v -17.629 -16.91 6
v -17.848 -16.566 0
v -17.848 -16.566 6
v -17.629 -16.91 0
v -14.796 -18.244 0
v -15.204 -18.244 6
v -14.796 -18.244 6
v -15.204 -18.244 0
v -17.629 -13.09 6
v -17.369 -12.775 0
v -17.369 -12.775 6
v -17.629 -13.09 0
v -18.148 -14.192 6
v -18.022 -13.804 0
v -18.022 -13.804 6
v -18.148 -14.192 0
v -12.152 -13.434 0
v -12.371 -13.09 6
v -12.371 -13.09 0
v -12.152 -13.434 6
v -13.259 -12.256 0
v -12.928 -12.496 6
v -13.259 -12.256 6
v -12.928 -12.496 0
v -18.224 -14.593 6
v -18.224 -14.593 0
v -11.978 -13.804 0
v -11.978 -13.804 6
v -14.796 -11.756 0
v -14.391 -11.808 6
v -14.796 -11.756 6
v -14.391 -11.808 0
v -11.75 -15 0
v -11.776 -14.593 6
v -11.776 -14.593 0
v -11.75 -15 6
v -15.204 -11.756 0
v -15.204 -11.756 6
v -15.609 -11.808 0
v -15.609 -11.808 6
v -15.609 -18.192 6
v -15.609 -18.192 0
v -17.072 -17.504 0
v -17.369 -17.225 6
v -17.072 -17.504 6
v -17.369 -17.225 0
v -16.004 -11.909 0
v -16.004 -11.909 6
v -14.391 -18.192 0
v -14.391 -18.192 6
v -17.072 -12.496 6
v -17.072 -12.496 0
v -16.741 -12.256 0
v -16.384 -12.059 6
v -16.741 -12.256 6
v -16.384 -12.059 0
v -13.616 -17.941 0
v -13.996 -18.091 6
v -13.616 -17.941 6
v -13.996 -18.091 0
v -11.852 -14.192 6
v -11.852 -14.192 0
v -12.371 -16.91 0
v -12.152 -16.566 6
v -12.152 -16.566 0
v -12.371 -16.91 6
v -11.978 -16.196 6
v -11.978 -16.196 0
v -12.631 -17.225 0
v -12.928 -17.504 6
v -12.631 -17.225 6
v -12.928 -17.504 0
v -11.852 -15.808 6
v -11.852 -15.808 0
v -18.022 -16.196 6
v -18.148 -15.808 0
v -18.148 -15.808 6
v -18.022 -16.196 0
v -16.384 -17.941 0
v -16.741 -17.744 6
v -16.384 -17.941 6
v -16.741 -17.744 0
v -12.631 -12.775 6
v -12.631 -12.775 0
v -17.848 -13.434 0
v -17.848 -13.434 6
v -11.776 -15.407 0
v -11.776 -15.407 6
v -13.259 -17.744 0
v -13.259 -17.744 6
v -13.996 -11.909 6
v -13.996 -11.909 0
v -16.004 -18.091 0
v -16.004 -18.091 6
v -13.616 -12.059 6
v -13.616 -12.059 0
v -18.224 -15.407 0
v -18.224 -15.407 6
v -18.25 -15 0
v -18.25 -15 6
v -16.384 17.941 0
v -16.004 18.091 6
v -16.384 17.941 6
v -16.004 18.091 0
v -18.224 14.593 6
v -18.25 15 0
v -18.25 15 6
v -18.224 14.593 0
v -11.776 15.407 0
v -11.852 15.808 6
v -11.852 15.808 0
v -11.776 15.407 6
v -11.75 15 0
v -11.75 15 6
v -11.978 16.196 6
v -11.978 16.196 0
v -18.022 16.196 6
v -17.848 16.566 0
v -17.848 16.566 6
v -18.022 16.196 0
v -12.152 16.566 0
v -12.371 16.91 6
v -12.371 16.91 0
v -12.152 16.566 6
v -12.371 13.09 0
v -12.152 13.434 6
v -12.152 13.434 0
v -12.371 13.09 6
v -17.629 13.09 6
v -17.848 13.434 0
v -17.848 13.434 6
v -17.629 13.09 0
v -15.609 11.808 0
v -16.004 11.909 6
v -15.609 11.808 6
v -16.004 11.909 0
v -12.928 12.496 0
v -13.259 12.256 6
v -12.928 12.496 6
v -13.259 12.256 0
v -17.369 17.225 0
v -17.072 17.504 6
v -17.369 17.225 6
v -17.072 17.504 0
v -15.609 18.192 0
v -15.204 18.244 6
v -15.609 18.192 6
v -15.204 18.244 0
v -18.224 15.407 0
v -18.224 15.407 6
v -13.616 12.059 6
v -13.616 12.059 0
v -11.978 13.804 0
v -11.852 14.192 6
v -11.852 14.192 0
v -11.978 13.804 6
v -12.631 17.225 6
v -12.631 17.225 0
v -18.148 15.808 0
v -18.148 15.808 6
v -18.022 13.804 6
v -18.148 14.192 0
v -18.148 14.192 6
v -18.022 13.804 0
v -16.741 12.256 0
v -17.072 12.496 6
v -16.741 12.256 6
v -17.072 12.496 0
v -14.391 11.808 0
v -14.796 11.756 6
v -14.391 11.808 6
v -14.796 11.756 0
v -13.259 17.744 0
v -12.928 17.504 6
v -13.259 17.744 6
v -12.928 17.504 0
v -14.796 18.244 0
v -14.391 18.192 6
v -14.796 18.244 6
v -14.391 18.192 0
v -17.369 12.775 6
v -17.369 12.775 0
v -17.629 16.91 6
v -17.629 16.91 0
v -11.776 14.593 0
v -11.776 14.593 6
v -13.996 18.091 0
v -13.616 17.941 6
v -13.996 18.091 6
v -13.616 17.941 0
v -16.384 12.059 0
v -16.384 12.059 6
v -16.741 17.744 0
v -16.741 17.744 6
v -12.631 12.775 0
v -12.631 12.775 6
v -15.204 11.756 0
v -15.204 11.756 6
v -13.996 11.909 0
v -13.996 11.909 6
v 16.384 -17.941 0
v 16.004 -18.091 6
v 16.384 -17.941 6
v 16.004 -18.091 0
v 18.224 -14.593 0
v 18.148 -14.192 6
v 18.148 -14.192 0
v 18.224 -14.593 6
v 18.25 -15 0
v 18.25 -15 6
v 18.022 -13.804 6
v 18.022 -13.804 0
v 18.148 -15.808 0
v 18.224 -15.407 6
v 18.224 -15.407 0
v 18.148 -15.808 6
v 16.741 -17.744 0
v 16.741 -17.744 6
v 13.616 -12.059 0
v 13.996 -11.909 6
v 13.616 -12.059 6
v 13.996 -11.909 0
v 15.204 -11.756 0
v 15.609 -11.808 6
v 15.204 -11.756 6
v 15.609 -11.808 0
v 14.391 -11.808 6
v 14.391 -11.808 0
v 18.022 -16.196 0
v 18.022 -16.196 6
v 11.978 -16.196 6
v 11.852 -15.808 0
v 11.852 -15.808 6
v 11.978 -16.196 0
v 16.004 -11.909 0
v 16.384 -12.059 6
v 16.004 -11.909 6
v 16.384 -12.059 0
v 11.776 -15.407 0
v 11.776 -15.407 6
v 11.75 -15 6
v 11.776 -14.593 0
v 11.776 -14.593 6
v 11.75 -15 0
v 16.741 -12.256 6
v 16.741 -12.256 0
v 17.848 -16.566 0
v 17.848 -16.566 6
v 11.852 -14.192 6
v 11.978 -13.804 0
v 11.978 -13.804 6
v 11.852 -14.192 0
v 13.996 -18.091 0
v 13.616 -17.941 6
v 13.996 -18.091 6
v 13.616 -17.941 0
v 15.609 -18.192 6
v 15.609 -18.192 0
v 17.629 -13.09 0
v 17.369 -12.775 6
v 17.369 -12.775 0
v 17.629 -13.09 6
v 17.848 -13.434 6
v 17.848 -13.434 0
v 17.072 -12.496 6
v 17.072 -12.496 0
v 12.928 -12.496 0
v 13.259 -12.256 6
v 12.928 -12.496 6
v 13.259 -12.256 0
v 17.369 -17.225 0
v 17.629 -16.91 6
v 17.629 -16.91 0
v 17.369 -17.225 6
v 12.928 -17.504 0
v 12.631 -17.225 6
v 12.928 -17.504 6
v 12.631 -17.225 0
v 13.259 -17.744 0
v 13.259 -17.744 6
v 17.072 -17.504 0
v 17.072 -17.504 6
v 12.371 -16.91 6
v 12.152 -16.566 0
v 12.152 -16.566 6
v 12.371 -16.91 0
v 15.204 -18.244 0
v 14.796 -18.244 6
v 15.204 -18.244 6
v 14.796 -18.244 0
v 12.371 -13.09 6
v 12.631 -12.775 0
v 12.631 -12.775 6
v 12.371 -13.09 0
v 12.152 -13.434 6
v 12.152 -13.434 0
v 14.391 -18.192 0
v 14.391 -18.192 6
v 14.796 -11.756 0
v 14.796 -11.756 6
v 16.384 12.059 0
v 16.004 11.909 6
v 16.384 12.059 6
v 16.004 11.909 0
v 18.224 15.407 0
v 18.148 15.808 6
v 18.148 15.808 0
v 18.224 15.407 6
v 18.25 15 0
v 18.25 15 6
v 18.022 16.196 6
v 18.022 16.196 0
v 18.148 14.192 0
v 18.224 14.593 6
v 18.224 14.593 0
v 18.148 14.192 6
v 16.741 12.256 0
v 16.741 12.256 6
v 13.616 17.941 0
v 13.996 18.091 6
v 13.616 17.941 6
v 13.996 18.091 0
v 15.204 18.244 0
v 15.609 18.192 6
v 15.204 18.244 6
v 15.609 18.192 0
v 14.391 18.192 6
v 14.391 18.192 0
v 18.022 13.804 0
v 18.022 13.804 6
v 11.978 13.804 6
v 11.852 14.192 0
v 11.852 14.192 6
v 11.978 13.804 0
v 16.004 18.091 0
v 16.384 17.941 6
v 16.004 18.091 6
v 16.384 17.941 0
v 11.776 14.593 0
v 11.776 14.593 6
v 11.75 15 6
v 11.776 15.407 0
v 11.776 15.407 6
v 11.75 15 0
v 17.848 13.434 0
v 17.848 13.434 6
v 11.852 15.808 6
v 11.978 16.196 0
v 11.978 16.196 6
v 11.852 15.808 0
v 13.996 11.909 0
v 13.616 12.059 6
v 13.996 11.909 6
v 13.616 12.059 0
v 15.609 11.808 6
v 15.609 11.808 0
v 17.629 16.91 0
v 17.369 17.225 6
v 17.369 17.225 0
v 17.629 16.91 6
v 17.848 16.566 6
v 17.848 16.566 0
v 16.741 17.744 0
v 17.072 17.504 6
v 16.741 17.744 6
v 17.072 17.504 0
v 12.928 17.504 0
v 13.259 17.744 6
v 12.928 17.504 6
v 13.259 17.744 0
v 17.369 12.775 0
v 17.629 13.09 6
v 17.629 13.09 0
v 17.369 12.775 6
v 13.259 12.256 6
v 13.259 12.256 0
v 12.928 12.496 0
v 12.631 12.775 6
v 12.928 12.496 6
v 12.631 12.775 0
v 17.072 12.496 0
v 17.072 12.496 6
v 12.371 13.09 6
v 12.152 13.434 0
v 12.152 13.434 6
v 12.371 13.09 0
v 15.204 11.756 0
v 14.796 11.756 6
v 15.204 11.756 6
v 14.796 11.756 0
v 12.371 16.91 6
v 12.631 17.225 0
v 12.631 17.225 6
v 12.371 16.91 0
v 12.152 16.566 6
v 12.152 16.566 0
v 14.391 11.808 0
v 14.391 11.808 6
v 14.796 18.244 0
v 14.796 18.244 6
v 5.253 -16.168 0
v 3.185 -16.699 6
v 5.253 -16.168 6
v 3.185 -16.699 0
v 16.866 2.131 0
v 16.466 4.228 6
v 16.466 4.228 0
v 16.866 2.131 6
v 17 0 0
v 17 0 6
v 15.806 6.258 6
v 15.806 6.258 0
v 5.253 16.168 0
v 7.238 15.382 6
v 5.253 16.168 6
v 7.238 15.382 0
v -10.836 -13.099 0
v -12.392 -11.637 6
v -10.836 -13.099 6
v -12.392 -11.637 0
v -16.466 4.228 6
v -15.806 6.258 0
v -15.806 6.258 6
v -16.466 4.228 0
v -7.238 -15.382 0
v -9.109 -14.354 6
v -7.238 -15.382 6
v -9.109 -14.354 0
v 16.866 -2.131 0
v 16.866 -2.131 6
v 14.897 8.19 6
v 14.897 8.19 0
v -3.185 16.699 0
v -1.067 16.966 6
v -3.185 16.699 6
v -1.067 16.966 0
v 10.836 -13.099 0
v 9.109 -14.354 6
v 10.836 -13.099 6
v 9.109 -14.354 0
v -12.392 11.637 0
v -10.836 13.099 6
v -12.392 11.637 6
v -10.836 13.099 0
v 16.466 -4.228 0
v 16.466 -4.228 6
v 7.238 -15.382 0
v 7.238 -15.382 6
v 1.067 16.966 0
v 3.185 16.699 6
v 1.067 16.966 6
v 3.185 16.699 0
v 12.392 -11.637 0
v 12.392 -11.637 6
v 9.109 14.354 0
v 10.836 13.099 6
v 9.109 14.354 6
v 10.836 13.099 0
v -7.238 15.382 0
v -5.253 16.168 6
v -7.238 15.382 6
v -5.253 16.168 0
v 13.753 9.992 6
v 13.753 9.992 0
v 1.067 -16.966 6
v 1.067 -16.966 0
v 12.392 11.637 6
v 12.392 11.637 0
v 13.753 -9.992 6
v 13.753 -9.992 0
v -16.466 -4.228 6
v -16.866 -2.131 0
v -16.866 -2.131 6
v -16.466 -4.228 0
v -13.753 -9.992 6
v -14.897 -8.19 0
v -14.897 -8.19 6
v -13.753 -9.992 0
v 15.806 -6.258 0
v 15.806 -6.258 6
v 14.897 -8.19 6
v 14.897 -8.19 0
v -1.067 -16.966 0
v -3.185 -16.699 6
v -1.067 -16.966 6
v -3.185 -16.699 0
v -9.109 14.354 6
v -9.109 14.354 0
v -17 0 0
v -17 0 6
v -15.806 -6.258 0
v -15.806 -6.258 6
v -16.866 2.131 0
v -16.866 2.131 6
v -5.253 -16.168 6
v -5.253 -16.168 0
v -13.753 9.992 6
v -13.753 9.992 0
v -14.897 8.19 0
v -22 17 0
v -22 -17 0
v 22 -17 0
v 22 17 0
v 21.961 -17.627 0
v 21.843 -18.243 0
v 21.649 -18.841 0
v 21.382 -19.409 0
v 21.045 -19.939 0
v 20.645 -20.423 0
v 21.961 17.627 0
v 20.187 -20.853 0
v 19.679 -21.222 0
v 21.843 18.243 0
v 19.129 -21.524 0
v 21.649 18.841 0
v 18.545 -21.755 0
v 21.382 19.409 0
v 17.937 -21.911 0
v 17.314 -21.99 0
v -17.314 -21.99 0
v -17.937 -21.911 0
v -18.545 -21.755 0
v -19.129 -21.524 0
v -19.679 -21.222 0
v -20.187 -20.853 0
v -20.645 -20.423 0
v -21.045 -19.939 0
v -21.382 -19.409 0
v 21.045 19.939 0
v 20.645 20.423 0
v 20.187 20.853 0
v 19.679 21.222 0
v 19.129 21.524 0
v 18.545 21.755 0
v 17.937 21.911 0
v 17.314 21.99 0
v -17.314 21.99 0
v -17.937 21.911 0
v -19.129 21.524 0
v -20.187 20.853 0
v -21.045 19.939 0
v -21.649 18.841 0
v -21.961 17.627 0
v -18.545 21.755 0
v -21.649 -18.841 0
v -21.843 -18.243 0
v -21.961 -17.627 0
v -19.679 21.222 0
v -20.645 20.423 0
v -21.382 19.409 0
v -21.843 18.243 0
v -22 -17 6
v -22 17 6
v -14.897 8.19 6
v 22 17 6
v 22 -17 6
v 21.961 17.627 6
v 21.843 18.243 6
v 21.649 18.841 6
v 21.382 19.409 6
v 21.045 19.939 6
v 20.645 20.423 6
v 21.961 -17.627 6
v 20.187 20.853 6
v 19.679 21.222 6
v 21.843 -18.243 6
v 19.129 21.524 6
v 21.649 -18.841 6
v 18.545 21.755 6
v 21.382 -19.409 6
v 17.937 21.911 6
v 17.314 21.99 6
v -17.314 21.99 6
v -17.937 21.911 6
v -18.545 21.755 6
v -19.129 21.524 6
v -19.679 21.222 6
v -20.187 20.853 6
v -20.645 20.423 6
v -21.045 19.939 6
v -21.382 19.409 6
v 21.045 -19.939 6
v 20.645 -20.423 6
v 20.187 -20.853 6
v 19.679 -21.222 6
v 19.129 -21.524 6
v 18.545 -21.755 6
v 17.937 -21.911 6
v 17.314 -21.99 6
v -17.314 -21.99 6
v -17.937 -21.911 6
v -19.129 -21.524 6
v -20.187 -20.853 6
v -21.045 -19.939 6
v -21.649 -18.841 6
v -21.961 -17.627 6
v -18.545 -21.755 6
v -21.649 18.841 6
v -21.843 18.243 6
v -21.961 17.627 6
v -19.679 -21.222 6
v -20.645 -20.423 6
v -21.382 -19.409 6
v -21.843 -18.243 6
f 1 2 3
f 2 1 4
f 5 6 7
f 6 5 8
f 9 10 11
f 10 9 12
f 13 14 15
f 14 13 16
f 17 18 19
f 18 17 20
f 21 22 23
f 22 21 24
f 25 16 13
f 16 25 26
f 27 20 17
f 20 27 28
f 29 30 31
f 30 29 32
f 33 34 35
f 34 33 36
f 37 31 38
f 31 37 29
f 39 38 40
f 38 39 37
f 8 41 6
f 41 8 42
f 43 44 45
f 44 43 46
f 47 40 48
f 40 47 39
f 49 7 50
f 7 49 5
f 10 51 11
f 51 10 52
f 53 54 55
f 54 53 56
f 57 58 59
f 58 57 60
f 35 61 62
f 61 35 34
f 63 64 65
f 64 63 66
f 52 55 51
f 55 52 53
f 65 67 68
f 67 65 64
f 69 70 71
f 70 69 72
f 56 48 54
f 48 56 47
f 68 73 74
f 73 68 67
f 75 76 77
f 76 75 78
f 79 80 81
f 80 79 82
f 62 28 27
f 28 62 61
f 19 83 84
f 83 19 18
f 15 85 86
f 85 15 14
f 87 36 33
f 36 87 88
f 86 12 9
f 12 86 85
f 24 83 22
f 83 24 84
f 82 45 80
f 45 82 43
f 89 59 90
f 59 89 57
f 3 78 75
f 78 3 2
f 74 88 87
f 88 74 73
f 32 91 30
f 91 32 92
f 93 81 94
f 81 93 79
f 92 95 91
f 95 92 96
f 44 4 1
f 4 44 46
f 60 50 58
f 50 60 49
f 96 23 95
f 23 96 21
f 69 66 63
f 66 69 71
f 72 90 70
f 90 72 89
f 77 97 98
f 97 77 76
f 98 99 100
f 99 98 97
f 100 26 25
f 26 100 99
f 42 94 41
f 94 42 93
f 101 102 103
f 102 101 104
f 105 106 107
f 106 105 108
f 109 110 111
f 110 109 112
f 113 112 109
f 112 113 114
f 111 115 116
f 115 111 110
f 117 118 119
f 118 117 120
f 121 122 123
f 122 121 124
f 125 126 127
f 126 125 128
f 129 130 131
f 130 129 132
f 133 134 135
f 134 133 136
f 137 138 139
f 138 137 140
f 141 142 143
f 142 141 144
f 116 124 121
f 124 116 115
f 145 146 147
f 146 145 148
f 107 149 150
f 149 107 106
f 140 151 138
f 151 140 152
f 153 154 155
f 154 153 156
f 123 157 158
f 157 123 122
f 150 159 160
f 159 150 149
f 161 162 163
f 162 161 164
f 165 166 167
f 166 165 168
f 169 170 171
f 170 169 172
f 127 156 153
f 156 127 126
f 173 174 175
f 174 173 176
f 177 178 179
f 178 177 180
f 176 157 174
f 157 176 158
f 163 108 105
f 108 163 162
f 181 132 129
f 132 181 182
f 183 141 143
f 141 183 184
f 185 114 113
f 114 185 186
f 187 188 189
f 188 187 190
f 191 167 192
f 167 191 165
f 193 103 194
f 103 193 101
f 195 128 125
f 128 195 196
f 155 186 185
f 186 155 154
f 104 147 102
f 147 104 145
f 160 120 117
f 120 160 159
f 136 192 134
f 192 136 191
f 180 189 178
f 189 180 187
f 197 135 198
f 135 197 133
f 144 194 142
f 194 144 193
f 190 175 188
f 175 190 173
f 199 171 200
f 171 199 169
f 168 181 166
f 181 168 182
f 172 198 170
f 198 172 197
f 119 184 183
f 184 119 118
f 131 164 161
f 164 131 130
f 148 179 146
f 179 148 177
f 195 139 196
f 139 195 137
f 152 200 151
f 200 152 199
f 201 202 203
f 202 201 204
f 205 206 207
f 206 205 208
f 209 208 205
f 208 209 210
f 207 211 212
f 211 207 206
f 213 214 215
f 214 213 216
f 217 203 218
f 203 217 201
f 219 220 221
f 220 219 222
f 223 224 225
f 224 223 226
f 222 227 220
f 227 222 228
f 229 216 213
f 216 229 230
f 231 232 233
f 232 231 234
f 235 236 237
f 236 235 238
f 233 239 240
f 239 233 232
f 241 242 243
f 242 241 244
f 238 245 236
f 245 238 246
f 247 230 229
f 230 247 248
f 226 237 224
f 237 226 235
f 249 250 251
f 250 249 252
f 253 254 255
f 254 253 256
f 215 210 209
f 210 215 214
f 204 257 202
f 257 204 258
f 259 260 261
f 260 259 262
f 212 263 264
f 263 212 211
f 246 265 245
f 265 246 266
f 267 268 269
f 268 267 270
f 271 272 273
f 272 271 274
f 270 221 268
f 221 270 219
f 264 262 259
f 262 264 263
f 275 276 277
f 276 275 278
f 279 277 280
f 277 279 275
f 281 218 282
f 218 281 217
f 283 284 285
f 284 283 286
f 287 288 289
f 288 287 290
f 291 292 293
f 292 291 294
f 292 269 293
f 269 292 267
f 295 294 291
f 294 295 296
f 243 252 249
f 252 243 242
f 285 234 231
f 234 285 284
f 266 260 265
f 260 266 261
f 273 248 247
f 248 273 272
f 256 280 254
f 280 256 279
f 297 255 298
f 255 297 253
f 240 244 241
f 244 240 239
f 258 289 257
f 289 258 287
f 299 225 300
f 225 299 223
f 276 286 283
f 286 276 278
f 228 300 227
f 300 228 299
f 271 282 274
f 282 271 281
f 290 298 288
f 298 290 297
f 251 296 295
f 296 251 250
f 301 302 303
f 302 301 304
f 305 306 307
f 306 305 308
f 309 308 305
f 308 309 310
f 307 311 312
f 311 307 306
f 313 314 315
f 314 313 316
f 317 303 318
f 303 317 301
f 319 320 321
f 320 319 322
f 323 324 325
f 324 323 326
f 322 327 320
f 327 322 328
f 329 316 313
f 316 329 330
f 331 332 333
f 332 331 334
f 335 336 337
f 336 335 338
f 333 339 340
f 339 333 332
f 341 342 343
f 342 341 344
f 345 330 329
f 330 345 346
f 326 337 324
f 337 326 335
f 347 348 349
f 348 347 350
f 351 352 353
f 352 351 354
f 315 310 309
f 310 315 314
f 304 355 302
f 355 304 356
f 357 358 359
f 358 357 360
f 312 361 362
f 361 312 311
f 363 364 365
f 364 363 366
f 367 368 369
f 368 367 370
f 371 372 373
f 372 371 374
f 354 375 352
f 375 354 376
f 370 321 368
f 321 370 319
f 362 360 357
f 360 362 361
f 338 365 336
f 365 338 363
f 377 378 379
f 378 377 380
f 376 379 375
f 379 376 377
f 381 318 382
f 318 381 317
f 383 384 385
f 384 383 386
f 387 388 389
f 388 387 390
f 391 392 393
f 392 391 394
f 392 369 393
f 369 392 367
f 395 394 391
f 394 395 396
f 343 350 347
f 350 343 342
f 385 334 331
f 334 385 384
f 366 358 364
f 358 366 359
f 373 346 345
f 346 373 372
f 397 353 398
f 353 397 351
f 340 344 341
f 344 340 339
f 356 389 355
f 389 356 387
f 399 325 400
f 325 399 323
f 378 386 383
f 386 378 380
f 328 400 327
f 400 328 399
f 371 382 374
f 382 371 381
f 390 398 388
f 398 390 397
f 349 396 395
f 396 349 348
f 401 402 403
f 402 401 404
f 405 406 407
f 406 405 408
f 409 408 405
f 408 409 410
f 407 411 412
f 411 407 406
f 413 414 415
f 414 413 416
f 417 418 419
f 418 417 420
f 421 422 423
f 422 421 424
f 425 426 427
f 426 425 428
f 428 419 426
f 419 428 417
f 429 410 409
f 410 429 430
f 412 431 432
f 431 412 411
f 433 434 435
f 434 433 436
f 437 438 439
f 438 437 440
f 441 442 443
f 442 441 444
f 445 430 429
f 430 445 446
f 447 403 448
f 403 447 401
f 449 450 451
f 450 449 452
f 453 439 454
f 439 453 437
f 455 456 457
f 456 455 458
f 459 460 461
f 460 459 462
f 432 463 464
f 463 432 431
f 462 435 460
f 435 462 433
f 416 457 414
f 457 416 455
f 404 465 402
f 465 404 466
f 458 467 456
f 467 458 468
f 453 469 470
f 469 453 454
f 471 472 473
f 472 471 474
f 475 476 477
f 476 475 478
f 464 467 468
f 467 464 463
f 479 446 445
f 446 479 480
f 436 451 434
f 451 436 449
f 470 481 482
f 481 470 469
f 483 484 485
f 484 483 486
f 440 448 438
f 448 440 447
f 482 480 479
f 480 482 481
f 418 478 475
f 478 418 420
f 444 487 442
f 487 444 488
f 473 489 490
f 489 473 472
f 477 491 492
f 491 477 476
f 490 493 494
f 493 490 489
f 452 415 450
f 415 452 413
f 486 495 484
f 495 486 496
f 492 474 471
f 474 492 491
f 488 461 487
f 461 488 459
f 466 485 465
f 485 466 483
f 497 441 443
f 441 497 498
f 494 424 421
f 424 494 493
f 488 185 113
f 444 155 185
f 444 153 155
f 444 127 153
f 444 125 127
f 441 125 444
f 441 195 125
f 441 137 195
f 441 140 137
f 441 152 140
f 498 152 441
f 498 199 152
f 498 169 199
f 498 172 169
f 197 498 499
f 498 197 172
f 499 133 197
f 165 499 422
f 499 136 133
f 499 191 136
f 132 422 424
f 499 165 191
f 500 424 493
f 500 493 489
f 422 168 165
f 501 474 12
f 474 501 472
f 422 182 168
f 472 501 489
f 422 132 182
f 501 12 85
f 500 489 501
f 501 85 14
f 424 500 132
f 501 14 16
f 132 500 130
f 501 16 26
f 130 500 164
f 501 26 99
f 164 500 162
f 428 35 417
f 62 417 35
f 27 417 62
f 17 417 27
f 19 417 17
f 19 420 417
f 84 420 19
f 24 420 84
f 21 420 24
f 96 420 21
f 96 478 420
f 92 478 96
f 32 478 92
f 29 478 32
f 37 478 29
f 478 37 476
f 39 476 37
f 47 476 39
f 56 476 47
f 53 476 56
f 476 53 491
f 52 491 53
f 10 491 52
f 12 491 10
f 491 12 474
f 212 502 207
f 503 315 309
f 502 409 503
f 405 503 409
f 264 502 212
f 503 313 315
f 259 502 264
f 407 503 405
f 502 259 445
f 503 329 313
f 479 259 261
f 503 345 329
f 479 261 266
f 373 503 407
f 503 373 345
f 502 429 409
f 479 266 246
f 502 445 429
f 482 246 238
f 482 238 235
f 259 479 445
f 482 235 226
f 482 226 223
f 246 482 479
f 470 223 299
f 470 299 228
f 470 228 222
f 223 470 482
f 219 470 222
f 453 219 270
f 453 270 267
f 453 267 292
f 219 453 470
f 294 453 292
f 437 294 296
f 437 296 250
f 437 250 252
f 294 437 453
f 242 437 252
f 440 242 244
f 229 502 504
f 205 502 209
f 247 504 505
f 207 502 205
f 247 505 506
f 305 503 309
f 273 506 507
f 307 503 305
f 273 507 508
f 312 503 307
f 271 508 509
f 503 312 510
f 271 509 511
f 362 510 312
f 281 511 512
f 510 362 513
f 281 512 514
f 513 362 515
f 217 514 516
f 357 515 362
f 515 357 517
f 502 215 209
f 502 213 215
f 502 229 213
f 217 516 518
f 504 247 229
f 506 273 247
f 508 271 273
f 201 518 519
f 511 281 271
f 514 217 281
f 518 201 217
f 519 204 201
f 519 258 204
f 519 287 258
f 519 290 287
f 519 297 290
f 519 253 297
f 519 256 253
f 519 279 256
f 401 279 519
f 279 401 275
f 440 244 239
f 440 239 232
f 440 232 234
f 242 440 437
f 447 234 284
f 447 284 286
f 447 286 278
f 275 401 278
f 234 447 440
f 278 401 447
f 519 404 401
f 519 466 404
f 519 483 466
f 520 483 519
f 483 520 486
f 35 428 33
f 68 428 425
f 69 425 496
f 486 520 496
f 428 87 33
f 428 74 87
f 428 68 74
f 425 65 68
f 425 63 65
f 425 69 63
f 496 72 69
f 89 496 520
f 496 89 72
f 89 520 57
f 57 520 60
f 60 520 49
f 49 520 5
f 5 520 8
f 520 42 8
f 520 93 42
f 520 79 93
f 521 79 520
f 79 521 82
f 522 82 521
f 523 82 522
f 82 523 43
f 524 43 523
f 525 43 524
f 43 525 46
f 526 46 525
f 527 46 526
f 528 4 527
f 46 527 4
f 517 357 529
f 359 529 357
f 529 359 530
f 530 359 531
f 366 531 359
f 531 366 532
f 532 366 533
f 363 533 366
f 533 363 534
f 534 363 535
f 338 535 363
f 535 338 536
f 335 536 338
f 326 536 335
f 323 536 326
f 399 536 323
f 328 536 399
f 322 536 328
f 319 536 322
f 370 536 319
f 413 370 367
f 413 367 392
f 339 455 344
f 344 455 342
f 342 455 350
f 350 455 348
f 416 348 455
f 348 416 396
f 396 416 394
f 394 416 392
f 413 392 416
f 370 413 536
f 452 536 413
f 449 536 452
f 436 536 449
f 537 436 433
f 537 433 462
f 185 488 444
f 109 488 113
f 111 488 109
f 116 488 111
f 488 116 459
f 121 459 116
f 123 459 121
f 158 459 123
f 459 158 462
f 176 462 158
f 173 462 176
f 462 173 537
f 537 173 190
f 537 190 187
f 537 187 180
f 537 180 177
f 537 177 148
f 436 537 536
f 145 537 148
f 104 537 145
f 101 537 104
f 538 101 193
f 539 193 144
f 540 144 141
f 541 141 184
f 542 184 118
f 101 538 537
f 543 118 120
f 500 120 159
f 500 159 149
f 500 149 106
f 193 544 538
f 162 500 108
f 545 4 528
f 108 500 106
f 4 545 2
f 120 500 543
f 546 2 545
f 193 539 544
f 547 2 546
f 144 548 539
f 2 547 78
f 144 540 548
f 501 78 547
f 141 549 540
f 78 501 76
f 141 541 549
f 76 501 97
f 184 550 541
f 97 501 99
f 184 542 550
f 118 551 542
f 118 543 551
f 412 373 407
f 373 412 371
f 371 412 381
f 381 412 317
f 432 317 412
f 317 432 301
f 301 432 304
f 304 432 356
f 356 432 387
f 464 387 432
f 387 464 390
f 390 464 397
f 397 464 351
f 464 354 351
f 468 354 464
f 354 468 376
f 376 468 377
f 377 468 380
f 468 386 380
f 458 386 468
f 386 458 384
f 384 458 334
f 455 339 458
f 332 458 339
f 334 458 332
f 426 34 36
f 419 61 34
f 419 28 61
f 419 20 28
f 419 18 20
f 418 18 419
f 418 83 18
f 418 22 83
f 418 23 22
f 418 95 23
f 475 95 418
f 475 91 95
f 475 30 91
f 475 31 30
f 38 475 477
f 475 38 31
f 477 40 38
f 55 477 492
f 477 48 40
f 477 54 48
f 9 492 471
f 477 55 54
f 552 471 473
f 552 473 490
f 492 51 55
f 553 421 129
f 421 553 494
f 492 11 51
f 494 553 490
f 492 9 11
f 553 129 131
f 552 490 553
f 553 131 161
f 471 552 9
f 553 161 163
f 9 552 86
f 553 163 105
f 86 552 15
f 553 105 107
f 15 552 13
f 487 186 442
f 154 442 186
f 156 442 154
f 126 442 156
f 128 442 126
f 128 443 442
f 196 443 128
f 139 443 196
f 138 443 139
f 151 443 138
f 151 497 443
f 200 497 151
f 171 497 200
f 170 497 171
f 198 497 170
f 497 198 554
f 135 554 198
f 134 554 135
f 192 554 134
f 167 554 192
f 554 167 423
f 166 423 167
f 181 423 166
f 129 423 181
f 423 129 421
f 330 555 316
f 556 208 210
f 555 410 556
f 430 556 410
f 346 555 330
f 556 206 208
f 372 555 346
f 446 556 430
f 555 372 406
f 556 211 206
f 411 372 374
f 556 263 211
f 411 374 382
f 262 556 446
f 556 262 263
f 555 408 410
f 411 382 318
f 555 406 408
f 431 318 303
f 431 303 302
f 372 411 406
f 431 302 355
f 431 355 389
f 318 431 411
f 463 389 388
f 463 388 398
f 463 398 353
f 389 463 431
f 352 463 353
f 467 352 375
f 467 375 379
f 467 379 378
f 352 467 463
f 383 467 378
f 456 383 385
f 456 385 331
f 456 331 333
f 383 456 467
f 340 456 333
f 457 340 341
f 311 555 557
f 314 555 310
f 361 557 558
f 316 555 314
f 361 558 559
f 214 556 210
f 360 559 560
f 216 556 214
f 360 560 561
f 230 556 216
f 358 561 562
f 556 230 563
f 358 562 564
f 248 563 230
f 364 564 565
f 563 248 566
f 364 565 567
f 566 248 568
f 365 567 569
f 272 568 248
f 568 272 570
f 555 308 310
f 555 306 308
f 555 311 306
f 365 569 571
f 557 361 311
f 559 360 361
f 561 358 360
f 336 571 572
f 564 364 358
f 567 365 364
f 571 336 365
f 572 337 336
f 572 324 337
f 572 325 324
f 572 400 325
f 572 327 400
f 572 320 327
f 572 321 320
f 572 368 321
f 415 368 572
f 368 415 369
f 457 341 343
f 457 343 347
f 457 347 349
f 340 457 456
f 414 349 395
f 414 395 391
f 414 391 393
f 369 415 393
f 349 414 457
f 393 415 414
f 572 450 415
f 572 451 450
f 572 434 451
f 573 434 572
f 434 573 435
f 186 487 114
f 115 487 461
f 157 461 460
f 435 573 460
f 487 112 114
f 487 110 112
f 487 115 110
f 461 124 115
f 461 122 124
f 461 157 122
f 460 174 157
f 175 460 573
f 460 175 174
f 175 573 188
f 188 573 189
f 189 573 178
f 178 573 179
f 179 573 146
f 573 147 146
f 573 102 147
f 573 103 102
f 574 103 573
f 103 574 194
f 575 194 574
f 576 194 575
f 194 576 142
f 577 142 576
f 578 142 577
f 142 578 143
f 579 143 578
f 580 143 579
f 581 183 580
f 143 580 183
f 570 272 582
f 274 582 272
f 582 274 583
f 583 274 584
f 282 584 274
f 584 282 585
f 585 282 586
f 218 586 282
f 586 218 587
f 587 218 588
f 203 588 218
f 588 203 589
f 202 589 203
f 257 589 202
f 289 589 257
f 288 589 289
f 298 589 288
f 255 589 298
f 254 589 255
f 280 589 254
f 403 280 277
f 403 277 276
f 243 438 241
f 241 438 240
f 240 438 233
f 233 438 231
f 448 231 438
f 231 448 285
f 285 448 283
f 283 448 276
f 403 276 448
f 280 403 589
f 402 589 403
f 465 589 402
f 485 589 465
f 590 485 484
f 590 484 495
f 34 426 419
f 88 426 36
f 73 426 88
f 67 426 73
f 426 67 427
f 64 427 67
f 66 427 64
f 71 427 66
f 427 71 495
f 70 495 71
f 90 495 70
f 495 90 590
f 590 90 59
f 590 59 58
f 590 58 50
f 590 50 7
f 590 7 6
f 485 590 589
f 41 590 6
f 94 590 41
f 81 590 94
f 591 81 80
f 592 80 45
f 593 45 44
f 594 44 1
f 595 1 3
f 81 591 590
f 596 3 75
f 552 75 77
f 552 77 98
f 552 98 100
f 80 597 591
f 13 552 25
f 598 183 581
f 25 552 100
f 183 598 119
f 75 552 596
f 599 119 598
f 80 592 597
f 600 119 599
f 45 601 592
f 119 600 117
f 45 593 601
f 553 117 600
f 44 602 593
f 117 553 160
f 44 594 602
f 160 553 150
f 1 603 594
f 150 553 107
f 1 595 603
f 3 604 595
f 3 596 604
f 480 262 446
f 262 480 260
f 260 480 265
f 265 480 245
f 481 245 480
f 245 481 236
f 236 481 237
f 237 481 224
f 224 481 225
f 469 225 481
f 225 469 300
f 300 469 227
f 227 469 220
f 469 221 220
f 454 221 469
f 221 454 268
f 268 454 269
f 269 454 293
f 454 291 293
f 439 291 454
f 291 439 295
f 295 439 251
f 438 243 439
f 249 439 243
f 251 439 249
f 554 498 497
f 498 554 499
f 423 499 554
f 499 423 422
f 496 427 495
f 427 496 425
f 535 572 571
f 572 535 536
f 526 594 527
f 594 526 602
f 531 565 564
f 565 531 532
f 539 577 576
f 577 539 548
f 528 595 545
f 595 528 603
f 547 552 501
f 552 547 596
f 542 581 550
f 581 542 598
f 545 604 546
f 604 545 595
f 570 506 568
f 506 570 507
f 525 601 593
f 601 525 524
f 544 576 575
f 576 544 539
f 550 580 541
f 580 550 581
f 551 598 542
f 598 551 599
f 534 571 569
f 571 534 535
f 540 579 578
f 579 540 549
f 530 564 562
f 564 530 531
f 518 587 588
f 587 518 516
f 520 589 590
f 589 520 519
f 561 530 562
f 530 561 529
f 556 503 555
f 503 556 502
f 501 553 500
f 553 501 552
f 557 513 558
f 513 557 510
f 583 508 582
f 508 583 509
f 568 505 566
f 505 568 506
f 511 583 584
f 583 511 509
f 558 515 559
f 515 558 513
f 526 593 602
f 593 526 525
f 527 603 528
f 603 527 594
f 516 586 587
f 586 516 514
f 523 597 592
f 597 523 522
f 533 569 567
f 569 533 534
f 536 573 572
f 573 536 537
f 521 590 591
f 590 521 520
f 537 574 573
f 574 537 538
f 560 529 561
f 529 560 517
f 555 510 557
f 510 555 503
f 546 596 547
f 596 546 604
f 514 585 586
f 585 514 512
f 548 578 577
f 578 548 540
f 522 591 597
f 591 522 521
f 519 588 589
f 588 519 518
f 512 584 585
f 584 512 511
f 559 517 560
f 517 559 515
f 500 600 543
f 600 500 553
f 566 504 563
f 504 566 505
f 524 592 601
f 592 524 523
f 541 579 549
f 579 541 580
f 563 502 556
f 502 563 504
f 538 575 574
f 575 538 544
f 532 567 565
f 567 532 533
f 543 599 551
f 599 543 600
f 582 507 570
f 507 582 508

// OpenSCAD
$fn = 50;


difference() {
	union() {
		hull() {
			translate(v = [-17.0000000000, 17.0000000000, 0]) {
				cylinder(h = 6, r = 5);
			}
			translate(v = [17.0000000000, 17.0000000000, 0]) {
				cylinder(h = 6, r = 5);
			}
			translate(v = [-17.0000000000, -17.0000000000, 0]) {
				cylinder(h = 6, r = 5);
			}
			translate(v = [17.0000000000, -17.0000000000, 0]) {
				cylinder(h = 6, r = 5);
			}
		}
	}
	union() {
		#translate(v = [-15.0000000000, -15.0000000000, -100.0000000000]) {
			cylinder(h = 200, r = 3.2500000000);
		}
		#translate(v = [-15.0000000000, 15.0000000000, -100.0000000000]) {
			cylinder(h = 200, r = 3.2500000000);
		}
		#translate(v = [15.0000000000, -15.0000000000, -100.0000000000]) {
			cylinder(h = 200, r = 3.2500000000);
		}
		#translate(v = [15.0000000000, 15.0000000000, -100.0000000000]) {
			cylinder(h = 200, r = 3.2500000000);
		}
		#cylinder(h = 6, r = 17.0000000000);
	}
}
